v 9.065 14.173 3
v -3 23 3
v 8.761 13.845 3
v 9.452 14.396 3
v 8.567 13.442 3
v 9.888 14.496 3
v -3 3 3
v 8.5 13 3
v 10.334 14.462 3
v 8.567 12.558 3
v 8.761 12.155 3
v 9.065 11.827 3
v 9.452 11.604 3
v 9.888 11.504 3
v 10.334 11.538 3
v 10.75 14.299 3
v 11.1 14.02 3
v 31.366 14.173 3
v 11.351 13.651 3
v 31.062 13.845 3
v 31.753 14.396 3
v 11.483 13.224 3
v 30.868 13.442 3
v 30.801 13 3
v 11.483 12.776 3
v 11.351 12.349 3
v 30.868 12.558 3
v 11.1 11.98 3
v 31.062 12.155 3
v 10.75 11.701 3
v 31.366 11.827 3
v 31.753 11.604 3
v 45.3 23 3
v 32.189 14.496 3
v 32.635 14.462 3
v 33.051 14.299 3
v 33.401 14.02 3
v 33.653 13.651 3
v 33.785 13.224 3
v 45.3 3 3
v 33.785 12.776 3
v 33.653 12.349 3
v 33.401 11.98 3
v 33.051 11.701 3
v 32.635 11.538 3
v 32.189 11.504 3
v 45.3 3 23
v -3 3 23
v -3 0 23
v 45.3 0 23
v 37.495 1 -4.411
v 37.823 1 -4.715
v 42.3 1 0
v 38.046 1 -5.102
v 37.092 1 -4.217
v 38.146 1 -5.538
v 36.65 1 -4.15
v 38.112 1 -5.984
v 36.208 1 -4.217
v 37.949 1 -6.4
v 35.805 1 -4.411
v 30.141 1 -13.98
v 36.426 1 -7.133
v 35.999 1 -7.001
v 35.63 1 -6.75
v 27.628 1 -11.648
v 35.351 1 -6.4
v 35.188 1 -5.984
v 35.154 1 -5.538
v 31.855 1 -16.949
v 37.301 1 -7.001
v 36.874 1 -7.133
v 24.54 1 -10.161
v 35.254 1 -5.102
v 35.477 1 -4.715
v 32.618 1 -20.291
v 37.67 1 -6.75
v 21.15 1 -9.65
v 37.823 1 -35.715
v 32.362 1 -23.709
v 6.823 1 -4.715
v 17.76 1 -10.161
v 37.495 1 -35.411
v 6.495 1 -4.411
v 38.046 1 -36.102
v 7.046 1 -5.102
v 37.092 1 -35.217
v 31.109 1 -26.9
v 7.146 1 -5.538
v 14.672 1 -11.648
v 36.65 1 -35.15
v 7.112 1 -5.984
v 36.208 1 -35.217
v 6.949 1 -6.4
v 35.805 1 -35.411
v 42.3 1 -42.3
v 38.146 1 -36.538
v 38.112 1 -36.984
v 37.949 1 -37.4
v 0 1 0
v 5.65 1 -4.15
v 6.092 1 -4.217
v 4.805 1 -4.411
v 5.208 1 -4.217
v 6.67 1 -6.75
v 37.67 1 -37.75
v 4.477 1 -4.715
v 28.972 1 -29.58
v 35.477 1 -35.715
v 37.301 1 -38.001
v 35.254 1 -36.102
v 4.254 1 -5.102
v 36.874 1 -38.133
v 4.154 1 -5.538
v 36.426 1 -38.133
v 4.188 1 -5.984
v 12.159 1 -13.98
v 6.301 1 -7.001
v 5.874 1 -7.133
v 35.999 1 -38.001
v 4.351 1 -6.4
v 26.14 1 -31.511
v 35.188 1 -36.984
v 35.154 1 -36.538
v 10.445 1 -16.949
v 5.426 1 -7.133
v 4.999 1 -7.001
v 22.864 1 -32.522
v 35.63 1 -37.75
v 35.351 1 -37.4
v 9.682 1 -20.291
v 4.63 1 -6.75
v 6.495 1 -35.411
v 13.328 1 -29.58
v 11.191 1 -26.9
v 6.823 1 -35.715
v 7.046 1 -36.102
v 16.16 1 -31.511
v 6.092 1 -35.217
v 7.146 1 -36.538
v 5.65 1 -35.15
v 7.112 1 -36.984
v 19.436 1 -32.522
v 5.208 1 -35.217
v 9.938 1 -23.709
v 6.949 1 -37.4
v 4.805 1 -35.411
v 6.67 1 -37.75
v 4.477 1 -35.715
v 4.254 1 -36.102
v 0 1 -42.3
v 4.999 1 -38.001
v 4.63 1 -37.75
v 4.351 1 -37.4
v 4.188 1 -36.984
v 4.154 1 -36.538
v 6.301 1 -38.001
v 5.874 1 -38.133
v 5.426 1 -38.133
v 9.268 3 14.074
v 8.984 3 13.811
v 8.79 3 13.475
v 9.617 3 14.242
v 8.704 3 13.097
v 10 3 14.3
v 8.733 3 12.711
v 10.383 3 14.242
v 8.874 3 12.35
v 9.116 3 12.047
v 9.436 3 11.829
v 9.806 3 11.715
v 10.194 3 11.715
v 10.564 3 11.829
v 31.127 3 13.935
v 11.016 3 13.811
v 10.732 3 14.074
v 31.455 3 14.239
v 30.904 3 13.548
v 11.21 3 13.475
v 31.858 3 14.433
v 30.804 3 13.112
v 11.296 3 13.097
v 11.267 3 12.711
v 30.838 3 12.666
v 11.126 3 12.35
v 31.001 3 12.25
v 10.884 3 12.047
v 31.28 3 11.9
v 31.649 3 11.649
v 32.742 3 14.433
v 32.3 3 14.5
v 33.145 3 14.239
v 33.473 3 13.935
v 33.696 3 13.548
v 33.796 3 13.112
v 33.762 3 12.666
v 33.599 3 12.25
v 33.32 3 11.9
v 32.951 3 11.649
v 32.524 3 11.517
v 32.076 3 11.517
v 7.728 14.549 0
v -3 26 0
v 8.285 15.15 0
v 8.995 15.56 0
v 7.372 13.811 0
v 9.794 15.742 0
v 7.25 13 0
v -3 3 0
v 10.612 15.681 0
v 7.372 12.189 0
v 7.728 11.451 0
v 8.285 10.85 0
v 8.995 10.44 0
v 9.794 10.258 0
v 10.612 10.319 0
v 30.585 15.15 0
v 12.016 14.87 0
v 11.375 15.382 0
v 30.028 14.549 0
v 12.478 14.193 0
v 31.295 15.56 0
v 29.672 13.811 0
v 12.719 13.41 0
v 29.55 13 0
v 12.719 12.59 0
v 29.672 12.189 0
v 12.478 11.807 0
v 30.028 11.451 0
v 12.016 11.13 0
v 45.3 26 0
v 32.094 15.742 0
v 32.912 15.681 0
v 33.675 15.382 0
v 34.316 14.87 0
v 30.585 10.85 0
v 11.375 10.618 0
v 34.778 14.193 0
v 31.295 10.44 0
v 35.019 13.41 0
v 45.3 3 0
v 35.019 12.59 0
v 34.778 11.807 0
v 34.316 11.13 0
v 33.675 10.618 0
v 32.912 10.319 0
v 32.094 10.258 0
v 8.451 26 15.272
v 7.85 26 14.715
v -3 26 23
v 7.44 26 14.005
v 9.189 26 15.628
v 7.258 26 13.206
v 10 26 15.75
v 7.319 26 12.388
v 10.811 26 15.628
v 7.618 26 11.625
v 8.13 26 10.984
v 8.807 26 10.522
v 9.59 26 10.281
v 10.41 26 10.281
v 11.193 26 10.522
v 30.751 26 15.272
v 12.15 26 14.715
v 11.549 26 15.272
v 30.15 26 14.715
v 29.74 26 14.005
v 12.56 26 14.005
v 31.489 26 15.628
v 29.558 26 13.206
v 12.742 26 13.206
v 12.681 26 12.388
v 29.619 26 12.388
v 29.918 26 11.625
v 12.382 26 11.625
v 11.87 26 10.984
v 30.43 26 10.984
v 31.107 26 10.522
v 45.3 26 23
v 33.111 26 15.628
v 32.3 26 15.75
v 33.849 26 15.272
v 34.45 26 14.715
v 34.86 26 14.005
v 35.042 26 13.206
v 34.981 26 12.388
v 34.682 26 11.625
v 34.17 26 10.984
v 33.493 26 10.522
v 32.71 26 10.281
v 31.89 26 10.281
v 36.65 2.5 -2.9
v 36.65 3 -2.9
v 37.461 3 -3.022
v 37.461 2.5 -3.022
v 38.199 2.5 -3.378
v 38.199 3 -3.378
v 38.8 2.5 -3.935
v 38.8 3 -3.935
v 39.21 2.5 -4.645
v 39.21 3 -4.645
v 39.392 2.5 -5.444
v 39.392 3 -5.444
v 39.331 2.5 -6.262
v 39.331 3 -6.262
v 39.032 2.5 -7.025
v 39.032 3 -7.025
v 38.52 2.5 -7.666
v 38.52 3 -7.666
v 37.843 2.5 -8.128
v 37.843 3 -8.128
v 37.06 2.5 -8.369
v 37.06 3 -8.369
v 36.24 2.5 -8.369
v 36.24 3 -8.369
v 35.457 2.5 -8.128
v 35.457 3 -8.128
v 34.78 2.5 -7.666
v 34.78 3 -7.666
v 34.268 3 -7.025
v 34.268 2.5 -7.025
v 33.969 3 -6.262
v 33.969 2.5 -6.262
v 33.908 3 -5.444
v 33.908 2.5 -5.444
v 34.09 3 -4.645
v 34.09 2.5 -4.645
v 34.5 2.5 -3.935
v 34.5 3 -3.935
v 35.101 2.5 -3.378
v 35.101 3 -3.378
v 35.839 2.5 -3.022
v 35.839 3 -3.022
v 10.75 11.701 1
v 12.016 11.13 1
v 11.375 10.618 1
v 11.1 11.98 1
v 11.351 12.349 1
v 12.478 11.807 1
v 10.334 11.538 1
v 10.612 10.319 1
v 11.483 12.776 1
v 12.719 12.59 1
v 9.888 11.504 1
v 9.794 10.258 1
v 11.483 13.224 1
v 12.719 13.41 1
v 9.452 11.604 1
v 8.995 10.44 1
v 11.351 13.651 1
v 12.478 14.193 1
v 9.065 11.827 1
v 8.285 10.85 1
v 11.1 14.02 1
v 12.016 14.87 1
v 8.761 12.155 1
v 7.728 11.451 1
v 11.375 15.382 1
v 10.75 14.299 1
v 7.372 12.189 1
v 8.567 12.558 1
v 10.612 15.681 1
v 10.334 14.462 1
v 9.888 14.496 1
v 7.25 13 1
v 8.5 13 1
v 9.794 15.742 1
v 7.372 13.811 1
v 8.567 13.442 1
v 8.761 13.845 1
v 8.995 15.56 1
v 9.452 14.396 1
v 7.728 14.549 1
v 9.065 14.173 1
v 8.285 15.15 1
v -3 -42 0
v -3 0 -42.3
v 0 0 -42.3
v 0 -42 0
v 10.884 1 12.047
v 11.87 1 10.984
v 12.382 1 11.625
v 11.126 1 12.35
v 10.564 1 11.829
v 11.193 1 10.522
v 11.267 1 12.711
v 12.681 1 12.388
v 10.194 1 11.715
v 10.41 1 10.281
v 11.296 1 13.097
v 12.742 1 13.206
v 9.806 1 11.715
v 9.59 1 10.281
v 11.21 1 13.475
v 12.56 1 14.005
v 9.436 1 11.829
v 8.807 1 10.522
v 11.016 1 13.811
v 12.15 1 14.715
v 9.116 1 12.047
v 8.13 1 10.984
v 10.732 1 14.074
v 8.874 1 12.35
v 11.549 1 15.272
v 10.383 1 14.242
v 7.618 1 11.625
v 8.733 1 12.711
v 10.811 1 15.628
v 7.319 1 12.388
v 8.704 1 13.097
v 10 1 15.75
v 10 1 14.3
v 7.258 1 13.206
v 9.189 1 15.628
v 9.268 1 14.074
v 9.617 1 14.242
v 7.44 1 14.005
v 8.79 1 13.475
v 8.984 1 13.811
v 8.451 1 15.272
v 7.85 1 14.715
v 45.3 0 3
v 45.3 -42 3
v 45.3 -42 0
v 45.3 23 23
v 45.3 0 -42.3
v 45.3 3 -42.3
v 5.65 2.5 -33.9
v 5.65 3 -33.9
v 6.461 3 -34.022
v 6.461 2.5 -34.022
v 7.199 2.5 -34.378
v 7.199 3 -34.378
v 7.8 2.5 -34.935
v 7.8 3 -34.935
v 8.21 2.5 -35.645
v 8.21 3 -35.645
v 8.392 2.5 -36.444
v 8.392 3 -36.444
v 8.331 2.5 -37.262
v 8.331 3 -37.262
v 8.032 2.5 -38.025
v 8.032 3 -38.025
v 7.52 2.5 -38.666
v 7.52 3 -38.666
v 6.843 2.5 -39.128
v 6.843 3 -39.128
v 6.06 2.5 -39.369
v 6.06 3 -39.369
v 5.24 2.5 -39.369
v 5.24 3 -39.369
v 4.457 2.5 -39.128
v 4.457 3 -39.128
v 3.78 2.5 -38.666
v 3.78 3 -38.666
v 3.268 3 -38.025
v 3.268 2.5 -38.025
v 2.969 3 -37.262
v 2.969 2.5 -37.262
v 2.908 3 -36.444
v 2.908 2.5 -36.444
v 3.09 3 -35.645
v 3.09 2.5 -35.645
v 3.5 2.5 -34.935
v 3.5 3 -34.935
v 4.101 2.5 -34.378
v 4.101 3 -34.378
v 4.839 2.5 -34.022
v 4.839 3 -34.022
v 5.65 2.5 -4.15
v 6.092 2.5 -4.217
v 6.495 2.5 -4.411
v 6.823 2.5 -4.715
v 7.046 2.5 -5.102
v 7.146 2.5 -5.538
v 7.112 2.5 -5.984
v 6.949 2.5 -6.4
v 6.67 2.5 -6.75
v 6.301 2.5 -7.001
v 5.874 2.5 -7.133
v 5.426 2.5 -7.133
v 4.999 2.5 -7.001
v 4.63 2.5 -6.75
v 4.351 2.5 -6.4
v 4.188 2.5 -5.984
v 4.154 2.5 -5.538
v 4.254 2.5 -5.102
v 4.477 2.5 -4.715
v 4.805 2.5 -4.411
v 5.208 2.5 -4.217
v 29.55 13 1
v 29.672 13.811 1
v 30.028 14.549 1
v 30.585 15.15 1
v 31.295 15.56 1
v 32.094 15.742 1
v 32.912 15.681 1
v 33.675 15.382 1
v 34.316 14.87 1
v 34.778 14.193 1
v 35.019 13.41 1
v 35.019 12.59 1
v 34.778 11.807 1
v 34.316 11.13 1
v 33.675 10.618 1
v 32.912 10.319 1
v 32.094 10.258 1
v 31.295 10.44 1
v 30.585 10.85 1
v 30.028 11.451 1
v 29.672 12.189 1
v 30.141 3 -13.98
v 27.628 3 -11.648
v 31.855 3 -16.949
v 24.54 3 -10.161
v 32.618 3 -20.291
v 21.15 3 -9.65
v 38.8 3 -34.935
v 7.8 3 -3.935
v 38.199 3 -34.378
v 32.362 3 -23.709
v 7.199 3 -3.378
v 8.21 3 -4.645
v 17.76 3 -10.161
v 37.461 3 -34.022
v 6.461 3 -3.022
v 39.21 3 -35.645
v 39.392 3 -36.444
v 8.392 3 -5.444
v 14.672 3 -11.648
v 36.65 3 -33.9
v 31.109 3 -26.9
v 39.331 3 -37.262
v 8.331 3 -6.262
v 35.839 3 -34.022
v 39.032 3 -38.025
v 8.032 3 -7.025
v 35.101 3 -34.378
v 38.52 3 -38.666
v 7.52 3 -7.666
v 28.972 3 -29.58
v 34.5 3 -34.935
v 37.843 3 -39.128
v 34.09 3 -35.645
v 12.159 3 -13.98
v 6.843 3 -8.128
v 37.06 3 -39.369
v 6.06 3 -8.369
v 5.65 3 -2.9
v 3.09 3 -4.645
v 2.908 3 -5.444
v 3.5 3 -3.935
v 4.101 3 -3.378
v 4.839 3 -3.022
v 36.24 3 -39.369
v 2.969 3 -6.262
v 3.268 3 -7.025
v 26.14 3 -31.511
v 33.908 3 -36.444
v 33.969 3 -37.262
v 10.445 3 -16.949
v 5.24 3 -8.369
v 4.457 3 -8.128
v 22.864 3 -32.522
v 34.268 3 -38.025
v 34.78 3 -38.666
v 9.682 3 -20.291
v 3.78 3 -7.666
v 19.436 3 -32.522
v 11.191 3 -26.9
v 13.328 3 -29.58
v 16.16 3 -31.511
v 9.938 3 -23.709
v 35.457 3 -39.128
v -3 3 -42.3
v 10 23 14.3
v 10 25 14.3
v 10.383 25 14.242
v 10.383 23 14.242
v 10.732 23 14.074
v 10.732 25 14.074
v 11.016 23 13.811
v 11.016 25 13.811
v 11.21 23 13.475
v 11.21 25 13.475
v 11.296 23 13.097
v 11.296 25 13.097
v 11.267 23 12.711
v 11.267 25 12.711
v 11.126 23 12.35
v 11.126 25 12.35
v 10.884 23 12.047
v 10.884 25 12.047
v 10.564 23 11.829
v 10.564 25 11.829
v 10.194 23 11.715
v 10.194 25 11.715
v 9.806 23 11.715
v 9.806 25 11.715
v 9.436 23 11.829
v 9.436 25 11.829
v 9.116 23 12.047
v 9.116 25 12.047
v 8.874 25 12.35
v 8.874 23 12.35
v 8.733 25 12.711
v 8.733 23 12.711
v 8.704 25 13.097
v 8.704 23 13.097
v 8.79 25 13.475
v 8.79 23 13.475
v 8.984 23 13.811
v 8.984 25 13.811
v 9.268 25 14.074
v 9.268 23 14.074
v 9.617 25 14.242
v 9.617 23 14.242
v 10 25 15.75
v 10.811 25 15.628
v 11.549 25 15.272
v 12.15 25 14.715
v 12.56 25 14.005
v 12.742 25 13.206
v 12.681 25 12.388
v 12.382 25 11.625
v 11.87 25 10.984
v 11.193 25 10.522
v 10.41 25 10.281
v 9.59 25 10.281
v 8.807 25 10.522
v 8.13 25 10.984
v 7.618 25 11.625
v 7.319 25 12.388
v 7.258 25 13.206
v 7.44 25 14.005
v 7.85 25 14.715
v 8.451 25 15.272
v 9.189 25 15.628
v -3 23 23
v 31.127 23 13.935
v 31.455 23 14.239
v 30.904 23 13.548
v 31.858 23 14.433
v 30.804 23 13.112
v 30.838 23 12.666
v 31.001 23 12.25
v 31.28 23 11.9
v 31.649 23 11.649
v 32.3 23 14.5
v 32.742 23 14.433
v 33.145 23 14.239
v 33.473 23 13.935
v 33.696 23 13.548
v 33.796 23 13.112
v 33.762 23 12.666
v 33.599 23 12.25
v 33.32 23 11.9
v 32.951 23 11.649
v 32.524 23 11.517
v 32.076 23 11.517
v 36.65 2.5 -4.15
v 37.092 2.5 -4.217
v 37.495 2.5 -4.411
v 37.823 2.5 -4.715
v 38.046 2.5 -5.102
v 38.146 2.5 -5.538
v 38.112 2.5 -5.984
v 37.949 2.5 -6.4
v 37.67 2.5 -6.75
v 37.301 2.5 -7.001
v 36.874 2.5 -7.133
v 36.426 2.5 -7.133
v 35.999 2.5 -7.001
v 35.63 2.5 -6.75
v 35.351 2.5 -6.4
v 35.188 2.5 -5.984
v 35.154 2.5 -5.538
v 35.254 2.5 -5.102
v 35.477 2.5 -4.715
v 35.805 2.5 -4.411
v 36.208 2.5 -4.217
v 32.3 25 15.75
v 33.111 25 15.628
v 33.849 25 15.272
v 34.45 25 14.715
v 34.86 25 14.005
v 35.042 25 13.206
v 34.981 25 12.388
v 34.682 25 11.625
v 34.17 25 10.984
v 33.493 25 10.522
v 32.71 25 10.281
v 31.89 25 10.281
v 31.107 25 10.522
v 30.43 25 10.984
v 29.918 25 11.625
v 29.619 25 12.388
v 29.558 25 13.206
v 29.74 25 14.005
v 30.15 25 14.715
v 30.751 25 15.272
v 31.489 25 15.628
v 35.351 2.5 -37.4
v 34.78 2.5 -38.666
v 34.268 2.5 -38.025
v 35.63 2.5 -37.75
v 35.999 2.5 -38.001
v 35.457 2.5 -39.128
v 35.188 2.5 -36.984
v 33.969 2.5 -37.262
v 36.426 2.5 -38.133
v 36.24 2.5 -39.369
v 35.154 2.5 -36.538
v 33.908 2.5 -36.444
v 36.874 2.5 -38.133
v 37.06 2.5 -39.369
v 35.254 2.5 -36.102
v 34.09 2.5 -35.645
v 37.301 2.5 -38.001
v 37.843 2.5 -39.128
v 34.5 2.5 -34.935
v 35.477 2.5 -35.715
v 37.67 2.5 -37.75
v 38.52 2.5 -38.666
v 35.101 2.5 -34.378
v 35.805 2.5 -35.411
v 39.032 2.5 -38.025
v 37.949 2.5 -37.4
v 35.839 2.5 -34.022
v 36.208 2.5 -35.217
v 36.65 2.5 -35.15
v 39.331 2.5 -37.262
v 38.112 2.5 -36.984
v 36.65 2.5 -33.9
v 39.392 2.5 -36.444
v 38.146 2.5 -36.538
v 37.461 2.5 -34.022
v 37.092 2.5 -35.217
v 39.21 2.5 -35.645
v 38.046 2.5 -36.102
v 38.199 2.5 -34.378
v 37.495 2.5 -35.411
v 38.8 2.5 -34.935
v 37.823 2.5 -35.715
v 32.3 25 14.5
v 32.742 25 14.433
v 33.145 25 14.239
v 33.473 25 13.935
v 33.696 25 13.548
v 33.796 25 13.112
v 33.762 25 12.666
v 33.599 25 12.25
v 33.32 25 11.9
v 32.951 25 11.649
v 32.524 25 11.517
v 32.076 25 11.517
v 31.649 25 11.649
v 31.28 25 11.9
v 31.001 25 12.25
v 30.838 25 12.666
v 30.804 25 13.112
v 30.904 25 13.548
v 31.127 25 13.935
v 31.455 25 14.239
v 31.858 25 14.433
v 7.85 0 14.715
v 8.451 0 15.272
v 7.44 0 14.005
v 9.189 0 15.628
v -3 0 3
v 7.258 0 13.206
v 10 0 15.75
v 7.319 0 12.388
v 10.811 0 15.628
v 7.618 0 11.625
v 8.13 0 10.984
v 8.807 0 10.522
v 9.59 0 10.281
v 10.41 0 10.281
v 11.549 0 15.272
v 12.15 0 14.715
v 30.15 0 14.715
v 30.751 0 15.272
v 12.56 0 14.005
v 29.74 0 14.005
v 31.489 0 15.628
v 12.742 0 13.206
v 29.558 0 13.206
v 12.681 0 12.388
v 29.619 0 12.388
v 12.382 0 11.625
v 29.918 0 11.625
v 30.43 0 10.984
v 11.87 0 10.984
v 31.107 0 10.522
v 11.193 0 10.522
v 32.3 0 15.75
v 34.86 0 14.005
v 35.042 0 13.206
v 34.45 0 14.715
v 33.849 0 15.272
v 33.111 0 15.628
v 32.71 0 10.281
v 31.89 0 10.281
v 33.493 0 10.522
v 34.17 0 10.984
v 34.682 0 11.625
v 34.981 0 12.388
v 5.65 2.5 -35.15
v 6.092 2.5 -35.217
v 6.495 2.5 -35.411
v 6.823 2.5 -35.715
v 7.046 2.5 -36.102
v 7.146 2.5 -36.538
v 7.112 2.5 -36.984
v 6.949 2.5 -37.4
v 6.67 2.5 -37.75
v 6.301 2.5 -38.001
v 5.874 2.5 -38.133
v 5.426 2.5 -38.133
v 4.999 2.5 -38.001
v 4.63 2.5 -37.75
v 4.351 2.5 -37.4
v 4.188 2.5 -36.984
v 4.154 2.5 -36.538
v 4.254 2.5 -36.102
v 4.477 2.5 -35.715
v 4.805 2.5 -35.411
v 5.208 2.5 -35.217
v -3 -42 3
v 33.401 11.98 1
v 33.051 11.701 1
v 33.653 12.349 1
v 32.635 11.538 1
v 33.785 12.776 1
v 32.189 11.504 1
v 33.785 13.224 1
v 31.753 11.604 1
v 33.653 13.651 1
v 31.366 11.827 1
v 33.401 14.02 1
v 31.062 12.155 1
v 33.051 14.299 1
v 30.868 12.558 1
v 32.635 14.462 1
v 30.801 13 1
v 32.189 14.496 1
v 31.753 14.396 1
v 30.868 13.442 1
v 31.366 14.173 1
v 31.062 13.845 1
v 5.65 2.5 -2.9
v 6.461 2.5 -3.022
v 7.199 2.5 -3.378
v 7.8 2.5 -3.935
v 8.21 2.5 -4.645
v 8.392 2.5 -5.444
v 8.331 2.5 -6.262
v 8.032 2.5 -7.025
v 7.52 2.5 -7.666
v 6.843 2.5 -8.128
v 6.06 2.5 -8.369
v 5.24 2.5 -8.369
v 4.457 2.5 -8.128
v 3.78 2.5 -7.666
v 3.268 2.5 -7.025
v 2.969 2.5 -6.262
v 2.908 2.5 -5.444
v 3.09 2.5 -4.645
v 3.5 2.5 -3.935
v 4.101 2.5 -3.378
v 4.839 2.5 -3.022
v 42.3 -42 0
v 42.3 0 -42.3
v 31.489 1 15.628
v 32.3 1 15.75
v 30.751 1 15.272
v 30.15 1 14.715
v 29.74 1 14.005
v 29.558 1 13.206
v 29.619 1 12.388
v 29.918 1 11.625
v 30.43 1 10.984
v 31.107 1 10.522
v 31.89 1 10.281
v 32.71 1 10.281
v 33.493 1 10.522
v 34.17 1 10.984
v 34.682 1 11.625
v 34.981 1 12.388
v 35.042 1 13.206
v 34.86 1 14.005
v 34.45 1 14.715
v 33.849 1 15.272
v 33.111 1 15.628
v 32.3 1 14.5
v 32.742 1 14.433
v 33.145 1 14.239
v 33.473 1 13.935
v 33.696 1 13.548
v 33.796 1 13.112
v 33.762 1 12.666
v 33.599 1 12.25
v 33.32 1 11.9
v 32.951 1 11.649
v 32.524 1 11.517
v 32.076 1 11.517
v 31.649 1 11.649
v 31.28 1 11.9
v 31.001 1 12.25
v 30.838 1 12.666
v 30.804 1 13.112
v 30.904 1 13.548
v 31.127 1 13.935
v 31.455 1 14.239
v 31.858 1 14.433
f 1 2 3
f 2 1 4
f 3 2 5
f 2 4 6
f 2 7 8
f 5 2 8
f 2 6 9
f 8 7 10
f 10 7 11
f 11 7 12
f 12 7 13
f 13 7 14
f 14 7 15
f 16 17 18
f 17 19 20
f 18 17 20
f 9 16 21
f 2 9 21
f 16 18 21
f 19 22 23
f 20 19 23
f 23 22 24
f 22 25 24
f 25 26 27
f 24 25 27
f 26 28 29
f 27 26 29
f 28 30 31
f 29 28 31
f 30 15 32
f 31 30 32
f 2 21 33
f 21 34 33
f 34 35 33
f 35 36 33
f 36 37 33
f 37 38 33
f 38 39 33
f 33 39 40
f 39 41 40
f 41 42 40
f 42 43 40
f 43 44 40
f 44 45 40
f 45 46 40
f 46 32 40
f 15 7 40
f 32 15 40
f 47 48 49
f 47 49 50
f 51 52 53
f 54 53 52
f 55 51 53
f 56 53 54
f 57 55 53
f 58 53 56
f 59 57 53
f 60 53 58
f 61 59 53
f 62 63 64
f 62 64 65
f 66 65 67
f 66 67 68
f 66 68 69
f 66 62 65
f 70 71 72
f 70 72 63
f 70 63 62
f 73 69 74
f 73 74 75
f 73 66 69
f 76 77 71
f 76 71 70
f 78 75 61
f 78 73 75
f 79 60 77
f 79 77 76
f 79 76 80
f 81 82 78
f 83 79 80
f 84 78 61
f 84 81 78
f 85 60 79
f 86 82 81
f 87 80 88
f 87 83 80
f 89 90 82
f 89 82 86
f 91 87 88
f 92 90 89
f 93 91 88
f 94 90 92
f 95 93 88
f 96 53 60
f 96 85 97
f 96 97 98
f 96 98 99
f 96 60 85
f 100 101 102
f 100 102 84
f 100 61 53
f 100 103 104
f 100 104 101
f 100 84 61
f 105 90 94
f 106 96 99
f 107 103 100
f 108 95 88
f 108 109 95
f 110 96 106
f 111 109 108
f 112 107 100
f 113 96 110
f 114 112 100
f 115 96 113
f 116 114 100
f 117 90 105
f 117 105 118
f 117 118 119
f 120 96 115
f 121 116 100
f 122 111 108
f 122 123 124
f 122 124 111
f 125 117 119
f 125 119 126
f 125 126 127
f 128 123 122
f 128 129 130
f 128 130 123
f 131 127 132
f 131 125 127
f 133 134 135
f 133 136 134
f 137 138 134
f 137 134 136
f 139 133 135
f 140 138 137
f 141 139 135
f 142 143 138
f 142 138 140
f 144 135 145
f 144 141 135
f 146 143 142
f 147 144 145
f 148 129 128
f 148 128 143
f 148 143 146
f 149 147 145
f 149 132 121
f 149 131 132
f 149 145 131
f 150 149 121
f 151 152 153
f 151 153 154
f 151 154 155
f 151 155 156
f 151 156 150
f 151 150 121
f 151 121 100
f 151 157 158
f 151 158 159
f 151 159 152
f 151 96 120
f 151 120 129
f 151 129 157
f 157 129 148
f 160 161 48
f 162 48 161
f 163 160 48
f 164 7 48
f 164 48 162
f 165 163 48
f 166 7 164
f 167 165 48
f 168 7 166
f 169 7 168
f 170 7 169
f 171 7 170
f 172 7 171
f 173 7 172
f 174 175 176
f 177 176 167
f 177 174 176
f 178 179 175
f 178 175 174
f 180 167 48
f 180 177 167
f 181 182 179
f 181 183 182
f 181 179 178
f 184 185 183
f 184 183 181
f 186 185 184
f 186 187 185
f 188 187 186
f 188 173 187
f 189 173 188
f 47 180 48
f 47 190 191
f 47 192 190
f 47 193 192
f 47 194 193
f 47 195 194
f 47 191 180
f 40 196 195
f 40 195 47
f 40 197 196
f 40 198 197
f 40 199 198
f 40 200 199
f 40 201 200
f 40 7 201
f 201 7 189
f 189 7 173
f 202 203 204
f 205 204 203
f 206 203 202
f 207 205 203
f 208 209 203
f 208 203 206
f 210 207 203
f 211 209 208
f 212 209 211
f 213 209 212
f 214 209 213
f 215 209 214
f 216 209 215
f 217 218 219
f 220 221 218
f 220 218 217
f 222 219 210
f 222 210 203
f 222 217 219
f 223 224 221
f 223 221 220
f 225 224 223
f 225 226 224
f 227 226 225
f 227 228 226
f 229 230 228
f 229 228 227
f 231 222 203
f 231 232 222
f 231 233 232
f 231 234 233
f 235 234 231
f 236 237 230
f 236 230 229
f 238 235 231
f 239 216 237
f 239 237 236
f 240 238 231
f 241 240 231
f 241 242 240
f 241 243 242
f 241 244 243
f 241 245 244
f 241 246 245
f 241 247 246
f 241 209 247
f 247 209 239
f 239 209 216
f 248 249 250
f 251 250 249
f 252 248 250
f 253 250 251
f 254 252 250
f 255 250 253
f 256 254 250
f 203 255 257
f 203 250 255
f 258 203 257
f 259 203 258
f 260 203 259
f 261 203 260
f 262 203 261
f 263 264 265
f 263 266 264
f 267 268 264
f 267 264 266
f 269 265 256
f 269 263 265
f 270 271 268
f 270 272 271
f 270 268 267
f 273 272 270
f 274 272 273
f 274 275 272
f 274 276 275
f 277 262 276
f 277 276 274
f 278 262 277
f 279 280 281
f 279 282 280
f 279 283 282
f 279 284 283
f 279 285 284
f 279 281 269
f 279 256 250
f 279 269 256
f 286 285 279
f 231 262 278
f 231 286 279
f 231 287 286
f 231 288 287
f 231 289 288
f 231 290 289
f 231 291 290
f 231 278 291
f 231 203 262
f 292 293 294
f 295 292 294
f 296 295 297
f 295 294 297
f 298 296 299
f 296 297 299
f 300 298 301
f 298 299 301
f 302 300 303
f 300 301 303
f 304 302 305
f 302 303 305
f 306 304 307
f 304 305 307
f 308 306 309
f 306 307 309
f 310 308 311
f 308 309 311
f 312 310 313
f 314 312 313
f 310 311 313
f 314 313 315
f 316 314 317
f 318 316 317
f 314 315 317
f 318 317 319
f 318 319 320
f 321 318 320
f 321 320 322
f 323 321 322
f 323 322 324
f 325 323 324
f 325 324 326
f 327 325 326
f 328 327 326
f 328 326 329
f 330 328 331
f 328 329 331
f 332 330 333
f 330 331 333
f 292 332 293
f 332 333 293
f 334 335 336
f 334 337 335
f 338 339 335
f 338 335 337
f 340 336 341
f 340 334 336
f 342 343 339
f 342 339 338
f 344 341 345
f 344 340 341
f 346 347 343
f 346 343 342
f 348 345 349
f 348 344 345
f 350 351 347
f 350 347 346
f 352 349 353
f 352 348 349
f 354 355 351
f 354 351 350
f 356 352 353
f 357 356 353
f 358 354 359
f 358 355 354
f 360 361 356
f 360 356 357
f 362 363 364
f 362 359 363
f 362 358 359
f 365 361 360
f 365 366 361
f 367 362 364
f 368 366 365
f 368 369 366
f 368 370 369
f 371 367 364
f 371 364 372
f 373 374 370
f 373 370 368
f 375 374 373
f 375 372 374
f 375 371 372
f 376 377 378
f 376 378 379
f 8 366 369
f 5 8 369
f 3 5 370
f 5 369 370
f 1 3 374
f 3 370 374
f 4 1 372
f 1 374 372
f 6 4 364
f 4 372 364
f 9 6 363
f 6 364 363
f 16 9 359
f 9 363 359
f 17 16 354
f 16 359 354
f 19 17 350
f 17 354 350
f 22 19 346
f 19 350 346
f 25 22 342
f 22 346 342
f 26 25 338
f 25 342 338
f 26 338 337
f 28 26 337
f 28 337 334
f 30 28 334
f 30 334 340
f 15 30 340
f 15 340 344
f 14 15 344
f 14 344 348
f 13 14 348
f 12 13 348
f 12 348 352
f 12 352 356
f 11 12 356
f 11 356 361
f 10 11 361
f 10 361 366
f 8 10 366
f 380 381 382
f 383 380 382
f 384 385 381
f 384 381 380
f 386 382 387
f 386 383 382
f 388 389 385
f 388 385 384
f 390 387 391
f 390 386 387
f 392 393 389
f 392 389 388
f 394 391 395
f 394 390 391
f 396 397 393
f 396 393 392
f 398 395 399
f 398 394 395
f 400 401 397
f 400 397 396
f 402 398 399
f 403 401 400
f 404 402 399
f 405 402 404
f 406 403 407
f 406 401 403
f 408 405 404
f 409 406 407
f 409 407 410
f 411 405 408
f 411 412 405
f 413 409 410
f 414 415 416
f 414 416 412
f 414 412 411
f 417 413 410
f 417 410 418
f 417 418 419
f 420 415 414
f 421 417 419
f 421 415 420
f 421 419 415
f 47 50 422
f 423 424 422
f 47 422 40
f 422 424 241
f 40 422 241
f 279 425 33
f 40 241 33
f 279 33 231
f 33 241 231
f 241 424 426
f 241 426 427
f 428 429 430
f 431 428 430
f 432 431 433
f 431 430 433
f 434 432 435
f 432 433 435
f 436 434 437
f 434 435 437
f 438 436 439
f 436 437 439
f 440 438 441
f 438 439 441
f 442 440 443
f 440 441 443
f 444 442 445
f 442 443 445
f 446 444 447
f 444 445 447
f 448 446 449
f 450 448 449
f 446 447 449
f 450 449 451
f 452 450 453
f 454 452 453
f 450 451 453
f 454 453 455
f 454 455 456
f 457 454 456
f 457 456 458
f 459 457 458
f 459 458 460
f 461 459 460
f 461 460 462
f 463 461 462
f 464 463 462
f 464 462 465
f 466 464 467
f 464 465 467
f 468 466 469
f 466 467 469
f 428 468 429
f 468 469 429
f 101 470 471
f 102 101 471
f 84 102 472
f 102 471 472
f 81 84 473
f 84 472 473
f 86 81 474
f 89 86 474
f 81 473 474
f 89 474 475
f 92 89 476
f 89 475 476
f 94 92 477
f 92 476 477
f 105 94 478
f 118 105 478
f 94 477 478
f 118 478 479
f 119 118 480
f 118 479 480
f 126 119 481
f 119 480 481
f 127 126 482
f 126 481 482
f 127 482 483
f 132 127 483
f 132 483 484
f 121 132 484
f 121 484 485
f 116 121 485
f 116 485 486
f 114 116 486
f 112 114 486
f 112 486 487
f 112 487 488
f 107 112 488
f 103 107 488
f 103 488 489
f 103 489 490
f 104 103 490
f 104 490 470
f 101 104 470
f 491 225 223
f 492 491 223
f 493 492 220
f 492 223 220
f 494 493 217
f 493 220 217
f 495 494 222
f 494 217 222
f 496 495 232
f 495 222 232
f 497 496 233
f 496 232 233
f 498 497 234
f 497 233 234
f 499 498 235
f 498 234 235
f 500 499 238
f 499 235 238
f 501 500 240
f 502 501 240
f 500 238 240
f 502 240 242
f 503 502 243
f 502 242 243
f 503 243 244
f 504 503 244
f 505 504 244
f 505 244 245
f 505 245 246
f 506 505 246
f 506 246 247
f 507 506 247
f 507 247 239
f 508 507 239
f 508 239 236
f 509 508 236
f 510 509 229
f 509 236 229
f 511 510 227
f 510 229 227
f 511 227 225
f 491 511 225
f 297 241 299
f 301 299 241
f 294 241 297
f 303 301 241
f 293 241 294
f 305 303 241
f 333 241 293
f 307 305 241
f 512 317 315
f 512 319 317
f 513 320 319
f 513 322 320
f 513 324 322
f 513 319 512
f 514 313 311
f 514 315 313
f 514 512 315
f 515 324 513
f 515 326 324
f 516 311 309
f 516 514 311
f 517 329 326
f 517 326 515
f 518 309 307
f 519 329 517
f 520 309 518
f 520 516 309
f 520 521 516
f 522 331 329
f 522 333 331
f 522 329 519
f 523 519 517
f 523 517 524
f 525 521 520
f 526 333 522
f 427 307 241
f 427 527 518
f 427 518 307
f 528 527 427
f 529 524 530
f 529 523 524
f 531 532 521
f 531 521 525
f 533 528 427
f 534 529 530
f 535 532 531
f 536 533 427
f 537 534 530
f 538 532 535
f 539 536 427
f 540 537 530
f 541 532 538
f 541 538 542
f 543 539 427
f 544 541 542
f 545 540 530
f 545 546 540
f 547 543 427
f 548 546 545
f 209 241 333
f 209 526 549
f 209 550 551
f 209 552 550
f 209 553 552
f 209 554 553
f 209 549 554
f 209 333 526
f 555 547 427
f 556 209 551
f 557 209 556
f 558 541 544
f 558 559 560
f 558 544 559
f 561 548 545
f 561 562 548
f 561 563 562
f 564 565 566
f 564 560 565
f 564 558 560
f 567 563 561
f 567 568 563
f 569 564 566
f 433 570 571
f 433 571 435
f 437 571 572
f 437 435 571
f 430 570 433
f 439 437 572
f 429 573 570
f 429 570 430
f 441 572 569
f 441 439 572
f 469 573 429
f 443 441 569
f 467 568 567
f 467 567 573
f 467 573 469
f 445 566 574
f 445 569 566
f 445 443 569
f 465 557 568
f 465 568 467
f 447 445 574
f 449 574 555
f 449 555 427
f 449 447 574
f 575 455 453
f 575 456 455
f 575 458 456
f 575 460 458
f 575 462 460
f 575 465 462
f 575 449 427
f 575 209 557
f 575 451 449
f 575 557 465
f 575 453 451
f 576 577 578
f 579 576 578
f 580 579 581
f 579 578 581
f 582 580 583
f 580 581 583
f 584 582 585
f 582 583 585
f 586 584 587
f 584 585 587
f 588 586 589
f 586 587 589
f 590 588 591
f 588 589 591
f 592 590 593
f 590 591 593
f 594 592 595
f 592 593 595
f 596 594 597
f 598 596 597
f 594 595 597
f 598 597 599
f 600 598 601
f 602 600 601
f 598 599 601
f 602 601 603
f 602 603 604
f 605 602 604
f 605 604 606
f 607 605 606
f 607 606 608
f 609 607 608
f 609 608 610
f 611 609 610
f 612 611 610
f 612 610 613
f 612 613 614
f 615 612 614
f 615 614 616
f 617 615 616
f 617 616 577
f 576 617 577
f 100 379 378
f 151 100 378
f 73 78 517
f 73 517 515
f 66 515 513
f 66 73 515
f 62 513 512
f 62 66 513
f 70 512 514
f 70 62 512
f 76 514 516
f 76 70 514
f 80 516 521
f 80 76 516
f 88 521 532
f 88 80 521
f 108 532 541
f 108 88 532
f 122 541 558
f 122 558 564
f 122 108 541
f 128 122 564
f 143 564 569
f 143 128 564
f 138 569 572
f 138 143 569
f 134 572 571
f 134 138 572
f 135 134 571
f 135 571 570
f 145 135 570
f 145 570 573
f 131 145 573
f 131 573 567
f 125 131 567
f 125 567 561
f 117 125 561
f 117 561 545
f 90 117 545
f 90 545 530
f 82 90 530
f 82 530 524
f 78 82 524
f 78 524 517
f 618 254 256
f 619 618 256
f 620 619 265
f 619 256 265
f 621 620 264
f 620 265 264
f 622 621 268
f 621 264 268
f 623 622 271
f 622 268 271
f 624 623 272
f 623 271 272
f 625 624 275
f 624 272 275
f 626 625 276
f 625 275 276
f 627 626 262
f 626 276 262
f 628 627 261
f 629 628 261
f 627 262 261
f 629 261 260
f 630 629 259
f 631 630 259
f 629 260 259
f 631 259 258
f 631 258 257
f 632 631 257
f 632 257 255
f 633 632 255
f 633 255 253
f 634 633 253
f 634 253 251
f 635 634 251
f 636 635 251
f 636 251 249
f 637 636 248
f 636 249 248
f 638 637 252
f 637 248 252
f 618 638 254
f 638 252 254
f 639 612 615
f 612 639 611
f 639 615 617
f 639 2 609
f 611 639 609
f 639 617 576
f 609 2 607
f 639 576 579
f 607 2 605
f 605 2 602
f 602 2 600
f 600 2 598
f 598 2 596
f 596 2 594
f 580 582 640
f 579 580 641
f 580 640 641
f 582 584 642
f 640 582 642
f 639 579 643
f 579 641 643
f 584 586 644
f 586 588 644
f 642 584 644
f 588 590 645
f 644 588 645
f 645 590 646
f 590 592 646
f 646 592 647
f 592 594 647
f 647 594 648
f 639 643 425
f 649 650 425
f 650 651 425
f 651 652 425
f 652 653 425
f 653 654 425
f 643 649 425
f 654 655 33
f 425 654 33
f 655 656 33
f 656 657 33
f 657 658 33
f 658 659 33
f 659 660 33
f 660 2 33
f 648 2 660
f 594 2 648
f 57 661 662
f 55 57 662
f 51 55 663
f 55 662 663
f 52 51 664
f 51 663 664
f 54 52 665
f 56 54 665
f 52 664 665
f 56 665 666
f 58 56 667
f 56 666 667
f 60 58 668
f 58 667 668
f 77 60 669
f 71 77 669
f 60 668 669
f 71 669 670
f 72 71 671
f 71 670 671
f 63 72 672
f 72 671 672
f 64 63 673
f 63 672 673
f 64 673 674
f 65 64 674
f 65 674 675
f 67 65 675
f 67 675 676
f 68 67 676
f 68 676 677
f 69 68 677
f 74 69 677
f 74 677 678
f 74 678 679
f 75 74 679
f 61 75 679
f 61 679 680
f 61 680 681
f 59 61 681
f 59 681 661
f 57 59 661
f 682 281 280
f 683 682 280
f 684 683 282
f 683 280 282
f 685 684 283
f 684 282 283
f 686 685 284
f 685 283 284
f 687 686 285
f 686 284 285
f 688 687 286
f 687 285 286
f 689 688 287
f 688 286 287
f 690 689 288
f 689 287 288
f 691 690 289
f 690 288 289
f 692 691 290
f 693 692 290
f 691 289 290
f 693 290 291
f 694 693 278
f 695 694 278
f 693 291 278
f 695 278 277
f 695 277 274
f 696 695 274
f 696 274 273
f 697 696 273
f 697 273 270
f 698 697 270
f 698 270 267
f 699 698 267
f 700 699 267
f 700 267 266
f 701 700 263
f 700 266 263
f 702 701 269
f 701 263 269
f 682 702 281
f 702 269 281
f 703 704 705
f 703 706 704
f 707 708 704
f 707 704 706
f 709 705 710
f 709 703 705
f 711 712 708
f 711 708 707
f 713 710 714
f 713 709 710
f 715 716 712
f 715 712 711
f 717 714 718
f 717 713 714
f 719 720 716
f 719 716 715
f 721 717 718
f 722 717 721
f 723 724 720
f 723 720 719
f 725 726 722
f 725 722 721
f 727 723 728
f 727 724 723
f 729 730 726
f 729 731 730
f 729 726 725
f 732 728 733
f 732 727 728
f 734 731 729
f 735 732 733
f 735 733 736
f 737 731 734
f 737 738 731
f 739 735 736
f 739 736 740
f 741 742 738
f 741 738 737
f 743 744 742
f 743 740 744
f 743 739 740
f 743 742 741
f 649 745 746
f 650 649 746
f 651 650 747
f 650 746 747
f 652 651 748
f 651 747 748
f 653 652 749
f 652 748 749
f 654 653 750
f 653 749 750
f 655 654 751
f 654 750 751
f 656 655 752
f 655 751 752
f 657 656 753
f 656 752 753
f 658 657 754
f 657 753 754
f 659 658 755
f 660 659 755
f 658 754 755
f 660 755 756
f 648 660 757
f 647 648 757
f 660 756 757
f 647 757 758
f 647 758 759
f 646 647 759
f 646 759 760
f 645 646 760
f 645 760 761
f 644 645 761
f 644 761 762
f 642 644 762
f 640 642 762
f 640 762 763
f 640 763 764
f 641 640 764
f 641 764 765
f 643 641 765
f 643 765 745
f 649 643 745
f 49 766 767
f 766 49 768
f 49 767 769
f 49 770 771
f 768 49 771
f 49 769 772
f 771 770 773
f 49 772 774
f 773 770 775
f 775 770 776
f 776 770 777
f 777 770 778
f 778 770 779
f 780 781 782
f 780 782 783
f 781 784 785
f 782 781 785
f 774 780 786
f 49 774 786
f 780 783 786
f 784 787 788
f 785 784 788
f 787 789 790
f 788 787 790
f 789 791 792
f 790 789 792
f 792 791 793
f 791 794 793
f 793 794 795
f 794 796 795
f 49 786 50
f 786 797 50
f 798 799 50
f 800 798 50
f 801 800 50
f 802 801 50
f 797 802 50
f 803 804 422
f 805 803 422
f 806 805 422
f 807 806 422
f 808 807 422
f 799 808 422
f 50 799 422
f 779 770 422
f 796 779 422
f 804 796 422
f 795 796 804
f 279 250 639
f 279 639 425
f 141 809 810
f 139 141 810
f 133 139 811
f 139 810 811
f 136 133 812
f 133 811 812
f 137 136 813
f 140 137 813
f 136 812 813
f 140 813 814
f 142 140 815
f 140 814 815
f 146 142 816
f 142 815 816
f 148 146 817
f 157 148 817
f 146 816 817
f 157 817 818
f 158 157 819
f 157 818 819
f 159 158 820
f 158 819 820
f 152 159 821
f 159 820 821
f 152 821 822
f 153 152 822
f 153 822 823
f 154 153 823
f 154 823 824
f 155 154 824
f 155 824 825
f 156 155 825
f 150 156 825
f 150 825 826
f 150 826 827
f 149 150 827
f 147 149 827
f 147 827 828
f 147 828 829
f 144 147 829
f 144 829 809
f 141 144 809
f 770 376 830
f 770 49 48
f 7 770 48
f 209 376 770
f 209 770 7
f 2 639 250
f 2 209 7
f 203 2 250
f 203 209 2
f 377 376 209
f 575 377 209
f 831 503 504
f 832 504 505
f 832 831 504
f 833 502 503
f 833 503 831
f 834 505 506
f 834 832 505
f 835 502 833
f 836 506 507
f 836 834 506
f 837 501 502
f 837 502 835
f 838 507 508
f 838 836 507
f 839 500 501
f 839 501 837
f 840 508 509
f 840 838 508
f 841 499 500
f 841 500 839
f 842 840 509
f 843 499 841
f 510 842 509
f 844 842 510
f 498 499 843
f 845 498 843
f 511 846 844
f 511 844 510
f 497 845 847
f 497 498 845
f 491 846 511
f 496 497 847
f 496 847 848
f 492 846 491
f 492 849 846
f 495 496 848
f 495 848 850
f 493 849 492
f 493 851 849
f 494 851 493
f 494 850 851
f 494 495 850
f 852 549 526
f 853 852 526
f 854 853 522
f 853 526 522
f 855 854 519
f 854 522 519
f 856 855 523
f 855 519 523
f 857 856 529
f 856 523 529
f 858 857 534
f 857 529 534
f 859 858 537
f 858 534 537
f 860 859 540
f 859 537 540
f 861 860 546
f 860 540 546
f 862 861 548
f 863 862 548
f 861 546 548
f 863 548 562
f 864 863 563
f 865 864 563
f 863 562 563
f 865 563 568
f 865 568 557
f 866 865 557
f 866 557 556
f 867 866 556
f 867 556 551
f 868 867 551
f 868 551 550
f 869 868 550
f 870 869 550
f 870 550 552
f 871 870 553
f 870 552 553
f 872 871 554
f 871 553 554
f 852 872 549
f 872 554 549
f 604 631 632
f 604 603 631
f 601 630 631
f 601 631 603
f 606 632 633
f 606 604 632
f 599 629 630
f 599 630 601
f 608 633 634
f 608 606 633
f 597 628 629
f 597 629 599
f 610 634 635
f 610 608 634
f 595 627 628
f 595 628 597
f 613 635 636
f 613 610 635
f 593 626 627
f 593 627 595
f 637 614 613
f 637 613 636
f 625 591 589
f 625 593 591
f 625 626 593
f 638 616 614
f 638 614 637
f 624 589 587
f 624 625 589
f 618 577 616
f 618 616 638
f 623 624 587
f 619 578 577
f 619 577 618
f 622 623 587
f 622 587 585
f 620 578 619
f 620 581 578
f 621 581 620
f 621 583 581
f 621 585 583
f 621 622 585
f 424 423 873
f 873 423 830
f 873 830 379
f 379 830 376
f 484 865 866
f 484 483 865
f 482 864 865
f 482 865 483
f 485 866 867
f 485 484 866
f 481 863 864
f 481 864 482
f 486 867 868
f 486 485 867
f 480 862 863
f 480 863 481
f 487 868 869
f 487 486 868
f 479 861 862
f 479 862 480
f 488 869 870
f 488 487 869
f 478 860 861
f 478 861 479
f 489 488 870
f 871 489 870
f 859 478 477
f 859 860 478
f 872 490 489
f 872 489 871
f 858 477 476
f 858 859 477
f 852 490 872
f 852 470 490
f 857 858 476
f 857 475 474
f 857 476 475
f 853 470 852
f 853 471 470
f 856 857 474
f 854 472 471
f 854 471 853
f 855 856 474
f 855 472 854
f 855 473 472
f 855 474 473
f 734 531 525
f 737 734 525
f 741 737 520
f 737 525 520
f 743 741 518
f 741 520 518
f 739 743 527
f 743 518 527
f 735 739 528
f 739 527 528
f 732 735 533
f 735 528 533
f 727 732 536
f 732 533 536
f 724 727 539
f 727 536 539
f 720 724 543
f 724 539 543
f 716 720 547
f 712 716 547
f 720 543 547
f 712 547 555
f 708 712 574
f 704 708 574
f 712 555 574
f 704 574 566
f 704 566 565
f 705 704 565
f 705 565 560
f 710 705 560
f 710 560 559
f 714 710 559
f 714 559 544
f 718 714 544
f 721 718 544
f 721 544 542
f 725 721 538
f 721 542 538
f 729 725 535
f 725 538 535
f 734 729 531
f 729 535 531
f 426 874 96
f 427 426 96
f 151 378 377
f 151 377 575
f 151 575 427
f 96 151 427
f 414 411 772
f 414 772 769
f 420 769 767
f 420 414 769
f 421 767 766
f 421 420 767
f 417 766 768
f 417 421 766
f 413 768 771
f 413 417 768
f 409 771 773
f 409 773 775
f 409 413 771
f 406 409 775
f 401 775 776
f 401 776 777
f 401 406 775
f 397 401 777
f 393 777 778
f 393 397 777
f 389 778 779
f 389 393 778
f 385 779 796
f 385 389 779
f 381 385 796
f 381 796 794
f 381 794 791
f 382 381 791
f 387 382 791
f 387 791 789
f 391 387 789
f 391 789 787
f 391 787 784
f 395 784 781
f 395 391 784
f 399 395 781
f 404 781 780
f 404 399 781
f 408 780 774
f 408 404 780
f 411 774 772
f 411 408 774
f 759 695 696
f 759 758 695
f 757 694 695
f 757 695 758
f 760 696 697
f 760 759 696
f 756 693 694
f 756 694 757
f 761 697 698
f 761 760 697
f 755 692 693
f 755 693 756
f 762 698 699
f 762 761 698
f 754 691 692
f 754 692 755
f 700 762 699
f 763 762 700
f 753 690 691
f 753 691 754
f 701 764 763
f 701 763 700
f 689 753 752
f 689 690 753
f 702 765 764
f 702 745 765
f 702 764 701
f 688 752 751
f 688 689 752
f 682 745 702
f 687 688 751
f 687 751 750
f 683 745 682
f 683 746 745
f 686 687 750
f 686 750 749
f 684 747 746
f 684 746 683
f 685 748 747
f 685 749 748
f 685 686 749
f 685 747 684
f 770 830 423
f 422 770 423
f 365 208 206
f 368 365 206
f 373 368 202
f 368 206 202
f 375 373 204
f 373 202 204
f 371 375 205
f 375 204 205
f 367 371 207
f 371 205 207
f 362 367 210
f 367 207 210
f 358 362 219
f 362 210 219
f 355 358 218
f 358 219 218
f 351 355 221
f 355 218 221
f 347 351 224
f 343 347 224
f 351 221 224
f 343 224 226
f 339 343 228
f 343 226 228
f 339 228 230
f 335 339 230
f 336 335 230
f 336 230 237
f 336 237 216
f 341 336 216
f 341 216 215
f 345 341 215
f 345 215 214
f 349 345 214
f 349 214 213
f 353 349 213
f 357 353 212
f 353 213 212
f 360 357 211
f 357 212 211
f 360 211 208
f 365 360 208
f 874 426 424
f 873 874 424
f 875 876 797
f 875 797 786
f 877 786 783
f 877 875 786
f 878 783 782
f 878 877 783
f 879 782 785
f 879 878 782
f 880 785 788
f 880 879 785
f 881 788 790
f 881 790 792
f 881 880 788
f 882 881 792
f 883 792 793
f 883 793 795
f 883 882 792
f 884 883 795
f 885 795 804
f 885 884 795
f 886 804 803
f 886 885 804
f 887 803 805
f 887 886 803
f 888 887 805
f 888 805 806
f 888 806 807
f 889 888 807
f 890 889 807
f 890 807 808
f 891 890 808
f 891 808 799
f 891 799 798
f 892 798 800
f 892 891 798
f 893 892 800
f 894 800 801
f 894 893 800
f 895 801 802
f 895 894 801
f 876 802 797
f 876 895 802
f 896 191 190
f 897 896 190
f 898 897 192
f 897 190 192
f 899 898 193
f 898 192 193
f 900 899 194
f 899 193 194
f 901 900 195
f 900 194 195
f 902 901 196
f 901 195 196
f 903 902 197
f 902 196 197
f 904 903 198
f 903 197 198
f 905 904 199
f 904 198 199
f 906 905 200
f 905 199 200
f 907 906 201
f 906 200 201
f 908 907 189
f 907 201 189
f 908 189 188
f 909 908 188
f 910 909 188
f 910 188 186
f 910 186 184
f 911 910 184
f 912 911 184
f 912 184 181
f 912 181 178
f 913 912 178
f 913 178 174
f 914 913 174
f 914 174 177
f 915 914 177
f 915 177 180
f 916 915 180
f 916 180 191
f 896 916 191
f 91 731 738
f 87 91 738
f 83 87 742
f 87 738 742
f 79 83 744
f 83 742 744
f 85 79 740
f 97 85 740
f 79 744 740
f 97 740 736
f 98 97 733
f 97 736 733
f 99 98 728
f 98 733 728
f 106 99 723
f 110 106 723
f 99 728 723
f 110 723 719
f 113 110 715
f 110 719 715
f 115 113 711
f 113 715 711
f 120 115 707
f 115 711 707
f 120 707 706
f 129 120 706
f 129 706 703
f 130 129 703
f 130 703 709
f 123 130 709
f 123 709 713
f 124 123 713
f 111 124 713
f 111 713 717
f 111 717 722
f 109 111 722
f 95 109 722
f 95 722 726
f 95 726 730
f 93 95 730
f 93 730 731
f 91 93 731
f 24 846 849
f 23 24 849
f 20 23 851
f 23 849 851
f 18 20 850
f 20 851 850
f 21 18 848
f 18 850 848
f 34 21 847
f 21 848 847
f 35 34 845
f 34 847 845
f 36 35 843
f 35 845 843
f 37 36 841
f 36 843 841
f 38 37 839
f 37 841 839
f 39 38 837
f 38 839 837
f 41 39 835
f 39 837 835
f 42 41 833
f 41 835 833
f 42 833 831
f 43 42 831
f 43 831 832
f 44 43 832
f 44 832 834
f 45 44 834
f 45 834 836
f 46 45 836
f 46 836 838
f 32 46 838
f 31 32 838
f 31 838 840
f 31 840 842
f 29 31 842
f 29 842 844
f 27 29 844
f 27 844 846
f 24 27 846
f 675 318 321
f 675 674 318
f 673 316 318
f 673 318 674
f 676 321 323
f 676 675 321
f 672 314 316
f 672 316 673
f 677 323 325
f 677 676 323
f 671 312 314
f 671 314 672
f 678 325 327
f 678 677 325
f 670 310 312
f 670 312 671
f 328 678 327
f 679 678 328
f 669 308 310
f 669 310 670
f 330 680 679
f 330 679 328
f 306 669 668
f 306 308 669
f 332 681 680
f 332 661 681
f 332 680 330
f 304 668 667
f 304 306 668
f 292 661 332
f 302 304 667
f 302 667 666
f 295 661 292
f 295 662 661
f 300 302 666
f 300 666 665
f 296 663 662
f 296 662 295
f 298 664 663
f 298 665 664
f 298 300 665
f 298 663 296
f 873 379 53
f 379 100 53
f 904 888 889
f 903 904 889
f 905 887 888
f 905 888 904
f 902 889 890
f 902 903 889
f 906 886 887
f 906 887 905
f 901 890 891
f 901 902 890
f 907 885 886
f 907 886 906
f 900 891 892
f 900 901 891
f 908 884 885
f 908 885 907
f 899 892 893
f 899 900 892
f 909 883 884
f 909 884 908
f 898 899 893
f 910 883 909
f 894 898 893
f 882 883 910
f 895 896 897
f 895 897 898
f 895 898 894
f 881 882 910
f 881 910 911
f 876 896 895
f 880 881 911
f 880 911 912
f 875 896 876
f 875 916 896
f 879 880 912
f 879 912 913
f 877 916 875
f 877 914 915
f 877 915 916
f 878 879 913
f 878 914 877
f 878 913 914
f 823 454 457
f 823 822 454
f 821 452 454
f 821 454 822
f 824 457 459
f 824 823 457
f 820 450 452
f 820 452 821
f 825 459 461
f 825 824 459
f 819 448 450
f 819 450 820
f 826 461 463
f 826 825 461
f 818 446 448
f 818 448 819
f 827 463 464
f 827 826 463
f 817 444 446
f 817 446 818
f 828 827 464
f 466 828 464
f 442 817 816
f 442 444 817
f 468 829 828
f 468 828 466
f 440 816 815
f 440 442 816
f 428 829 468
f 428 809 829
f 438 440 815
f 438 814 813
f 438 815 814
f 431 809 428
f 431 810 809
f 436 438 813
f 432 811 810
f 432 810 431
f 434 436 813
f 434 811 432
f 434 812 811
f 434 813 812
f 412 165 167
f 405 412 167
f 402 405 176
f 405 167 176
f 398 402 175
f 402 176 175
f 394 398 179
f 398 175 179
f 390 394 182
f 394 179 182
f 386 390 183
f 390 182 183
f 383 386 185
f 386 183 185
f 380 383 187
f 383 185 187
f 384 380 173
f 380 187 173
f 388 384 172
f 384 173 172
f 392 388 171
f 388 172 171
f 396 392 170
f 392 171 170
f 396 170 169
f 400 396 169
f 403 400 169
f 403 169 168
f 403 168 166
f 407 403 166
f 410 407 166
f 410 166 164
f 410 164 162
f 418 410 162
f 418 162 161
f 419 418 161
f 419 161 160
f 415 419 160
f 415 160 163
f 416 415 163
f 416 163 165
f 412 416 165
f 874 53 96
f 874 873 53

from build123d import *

# Parameters (mm, degrees)
SKETCH1_W                = 42.3
SKETCH1_H                = 42.3
SKETCH1_R                = 11.5
BOSS_EXTRUDE2_DEPTH      = 3
SKETCH2_R                = 1.5
CUT_EXTRUDE1_DEPTH       = 3
BOSS_EXTRUDE3_DEPTH      = 3
BOSS_EXTRUDE3_DEPTH_BACK = 42
SKETCH3_W                = 3
SKETCH3_H                = 42.3
SKETCH5_W                = 45.3
SKETCH5_H                = 45
BOSS_EXTRUDE4_DEPTH      = 3
CUT_EXTRUDE3_DEPTH       = 74.092954517
CUT_EXTRUDE3_DEPTH_BACK  = 3
SKETCH8_W                = 45.3
SKETCH8_H                = 45
BOSS_EXTRUDE5_DEPTH      = 3
SKETCH12_W               = 48.3
SKETCH12_H               = 3
BOSS_EXTRUDE6_DEPTH      = 23
SKETCH14_W               = 48.3
SKETCH14_H               = 3
BOSS_EXTRUDE7_DEPTH      = 20
SKETCH17_R               = 2.75
CUT_EXTRUDE5_DEPTH       = 0.5
CUT_EXTRUDE6_DEPTH       = 75.869085743
CUT_EXTRUDE6_DEPTH_BACK  = 3
SKETCH19_W               = 48.3
SKETCH19_H               = 3
BOSS_EXTRUDE8_DEPTH      = 20
SKETCH21_R               = 1.5
CUT_EXTRUDE7_DEPTH       = 20
SKETCH23_R               = 2.75
CUT_EXTRUDE9_DEPTH       = 1
SKETCH26_R               = 2.75
CUT_EXTRUDE10_DEPTH      = 1
SKETCH27_R               = 1.3
SKETCH27_R_2             = 1.5
CUT_EXTRUDE11_DEPTH      = 41
SKETCH30_R               = 2.75
CUT_EXTRUDE12_DEPTH      = 1
SKETCH31_R               = 2.75
CUT_EXTRUDE13_DEPTH      = 1
CUT_EXTRUDE14_START      = -1
SKETCH32_R               = 2.75
CUT_EXTRUDE14_DEPTH      = 1
CUT_EXTRUDE15_START      = -1
SKETCH33_R               = 2.75
CUT_EXTRUDE15_DEPTH      = 1
SKETCH38_W               = 42.3
SKETCH38_H               = 42.3
CUT_EXTRUDE16_DEPTH      = 1


with BuildPart() as part:
    # Sketch1 → Boss-Extrude2 (new body)
    with BuildSketch(Plane(origin=(0, 0, 0), x_dir=(1, 0, 0), z_dir=(0, 1, 0))):
        with Locations((21.15, 21.15)):
            Rectangle(SKETCH1_W, SKETCH1_H)
        with Locations(Location((21.15, 21.15, 0), (0, 0, 270))):
            Circle(SKETCH1_R, mode=Mode.SUBTRACT)
    extrude(amount=BOSS_EXTRUDE2_DEPTH)

    # Sketch2 → Cut-Extrude1 (cut)
    with BuildSketch(Plane(origin=(0, 3, 0), x_dir=(1, 0, 0), z_dir=(0, 1, 0))):
        with Locations(Location((5.65, 5.65, 0), (0, 0, 270))):
            Circle(SKETCH2_R)
        with Locations(Location((5.65, 36.65, 0), (0, 0, 270))):
            Circle(SKETCH2_R)
        with Locations(Location((36.65, 36.65, 0), (0, 0, 270))):
            Circle(SKETCH2_R)
        with Locations(Location((36.65, 5.65, 0), (0, 0, 270))):
            Circle(SKETCH2_R)
    extrude(amount=-CUT_EXTRUDE1_DEPTH, mode=Mode.SUBTRACT)

    # Sketch3 → Boss-Extrude3 (add, two sides: drawn at the far end of the back side and taken through both)
    with BuildSketch(Plane(origin=(0, 0, 0), x_dir=(1, 0, 0), z_dir=(0, 1, 0)).offset(-BOSS_EXTRUDE3_DEPTH_BACK)):
        with Locations((-1.5, 21.15)):
            Rectangle(SKETCH3_W, SKETCH3_H)
    extrude(amount=BOSS_EXTRUDE3_DEPTH + BOSS_EXTRUDE3_DEPTH_BACK)

    # Sketch5 → Boss-Extrude4 (add)
    with BuildSketch(Plane.XY):
        with Locations((19.65, -19.5)):
            Rectangle(SKETCH5_W, SKETCH5_H)
    extrude(amount=BOSS_EXTRUDE4_DEPTH)

    # Sketch6 → Cut-Extrude3 (cut, two sides: drawn at the far end of the back side and taken through both)
    with BuildSketch(Plane(origin=(0, 0, 0), x_dir=(0, 0, -1), z_dir=(1, 0, 0)).offset(-CUT_EXTRUDE3_DEPTH_BACK)):
        Polygon((-94.768878565, -136.096758859), (0, -42), (42.3, 0), (137.068878565, 94.096758859), (325.262396283, -95.440998271), (93.424639153, -325.634515989), align=None)
    extrude(amount=CUT_EXTRUDE3_DEPTH + CUT_EXTRUDE3_DEPTH_BACK, mode=Mode.SUBTRACT)

    # Sketch8 → Boss-Extrude5 (add)
    with BuildSketch(Plane(origin=(42.3, 0, 0), x_dir=(0, 0, -1), z_dir=(1, 0, 0))):
        with Locations((19.65, -19.5)):
            Rectangle(SKETCH8_W, SKETCH8_H)
    extrude(amount=BOSS_EXTRUDE5_DEPTH)

    # Sketch12 → Boss-Extrude6 (add)
    with BuildSketch(Plane(origin=(0, 3, 0), x_dir=(1, 0, 0), z_dir=(0, 1, 0))):
        with Locations((21.15, -1.5)):
            Rectangle(SKETCH12_W, SKETCH12_H)
    extrude(amount=BOSS_EXTRUDE6_DEPTH)

    # Sketch14 → Boss-Extrude7 (add)
    with BuildSketch(Plane.XY.offset(3)):
        with Locations((21.15, 24.5)):
            Rectangle(SKETCH14_W, SKETCH14_H)
    extrude(amount=BOSS_EXTRUDE7_DEPTH)

    # Sketch17 → Cut-Extrude5 (cut)
    with BuildSketch(Plane(origin=(0, 3, 0), x_dir=(1, 0, 0), z_dir=(0, 1, 0))):
        with Locations(Location((36.65, 36.65, 0), (0, 0, 270))):
            Circle(SKETCH17_R)
        with Locations(Location((36.65, 5.65, 0), (0, 0, 270))):
            Circle(SKETCH17_R)
        with Locations(Location((5.65, 36.65, 0), (0, 0, 270))):
            Circle(SKETCH17_R)
        with Locations(Location((5.65, 5.65, 0), (0, 0, 270))):
            Circle(SKETCH17_R)
    extrude(amount=-CUT_EXTRUDE5_DEPTH, mode=Mode.SUBTRACT)

    # Sketch18 → Cut-Extrude6 (cut, two sides: drawn at the far end of the back side and taken through both)
    with BuildSketch(Plane.ZY.offset(-42.3).offset(-CUT_EXTRUDE6_DEPTH_BACK)):
        Polygon((-163.053000202, 119.896595945), (-42.3, 0), (0, -42), (120.753000202, -161.896595945), (-119.040191688, -403.402596349), (-402.846192092, -121.609404459), align=None)
    extrude(amount=CUT_EXTRUDE6_DEPTH + CUT_EXTRUDE6_DEPTH_BACK, mode=Mode.SUBTRACT)

    # Sketch19 → Boss-Extrude8 (add)
    with BuildSketch(Plane.XY.offset(3)):
        with Locations((21.15, 1.5)):
            Rectangle(SKETCH19_W, SKETCH19_H)
    extrude(amount=BOSS_EXTRUDE8_DEPTH)

    # Sketch21 → Cut-Extrude7 (cut)
    with BuildSketch(Plane(origin=(0, 0, 0), x_dir=(-1, 0, 0), z_dir=(0, 0, -1))):
        with Locations((-32.301370807, 13)):
            Circle(SKETCH21_R)
        with Locations((-10, 13)):
            Circle(SKETCH21_R)
    extrude(amount=-CUT_EXTRUDE7_DEPTH, mode=Mode.SUBTRACT)

    # Sketch23 → Cut-Extrude9 (cut)
    with BuildSketch(Plane(origin=(0, 0, 0), x_dir=(-1, 0, 0), z_dir=(0, 0, -1))):
        with Locations((-10, 13)):
            Circle(SKETCH23_R)
    extrude(amount=-CUT_EXTRUDE9_DEPTH, mode=Mode.SUBTRACT)

    # Sketch26 → Cut-Extrude10 (cut)
    with BuildSketch(Plane(origin=(0, 0, 0), x_dir=(-1, 0, 0), z_dir=(0, 0, -1))):
        with Locations((-32.3, 13)):
            Circle(SKETCH26_R)
    extrude(amount=-CUT_EXTRUDE10_DEPTH, mode=Mode.SUBTRACT)

    # Sketch27 → Cut-Extrude11 (cut)
    with BuildSketch(Plane(origin=(0, 26, 0), x_dir=(1, 0, 0), z_dir=(0, 1, 0))):
        with Locations(Location((10, -13, 0), (0, 0, 270))):
            Circle(SKETCH27_R)
        with Locations(Location((32.3, -13, 0), (0, 0, 270))):
            Circle(SKETCH27_R_2)
    extrude(amount=-CUT_EXTRUDE11_DEPTH, mode=Mode.SUBTRACT)

    # Sketch30 → Cut-Extrude12 (cut)
    with BuildSketch(Plane(origin=(0, 26, 0), x_dir=(1, 0, 0), z_dir=(0, 1, 0))):
        with Locations(Location((10, -13, 0), (0, 0, 270))):
            Circle(SKETCH30_R)
    extrude(amount=-CUT_EXTRUDE12_DEPTH, mode=Mode.SUBTRACT)

    # Sketch31 → Cut-Extrude13 (cut)
    with BuildSketch(Plane(origin=(0, 26, 0), x_dir=(1, 0, 0), z_dir=(0, 1, 0))):
        with Locations(Location((32.3, -13, 0), (0, 0, 270))):
            Circle(SKETCH31_R)
    extrude(amount=-CUT_EXTRUDE13_DEPTH, mode=Mode.SUBTRACT)

    # Sketch32 → Cut-Extrude14 (cut)
    with BuildSketch(Plane.XZ.offset(CUT_EXTRUDE14_START)):
        with Locations(Location((32.3, 13, 0), (0, 0, 90))):
            Circle(SKETCH32_R)
    extrude(amount=CUT_EXTRUDE14_DEPTH, mode=Mode.SUBTRACT)

    # Sketch33 → Cut-Extrude15 (cut)
    with BuildSketch(Plane.XZ.offset(CUT_EXTRUDE15_START)):
        with Locations(Location((10, 13, 0), (0, 0, 90))):
            Circle(SKETCH33_R)
    extrude(amount=CUT_EXTRUDE15_DEPTH, mode=Mode.SUBTRACT)

    # Sketch38 → Cut-Extrude16 (cut)
    with BuildSketch(Plane(origin=(0, 0, 0), x_dir=(-1, 0, 0), z_dir=(0, -1, 0))):
        with Locations((-21.15, 21.15)):
            Rectangle(SKETCH38_W, SKETCH38_H)
    extrude(amount=-CUT_EXTRUDE16_DEPTH, mode=Mode.SUBTRACT)


solid = part.part
